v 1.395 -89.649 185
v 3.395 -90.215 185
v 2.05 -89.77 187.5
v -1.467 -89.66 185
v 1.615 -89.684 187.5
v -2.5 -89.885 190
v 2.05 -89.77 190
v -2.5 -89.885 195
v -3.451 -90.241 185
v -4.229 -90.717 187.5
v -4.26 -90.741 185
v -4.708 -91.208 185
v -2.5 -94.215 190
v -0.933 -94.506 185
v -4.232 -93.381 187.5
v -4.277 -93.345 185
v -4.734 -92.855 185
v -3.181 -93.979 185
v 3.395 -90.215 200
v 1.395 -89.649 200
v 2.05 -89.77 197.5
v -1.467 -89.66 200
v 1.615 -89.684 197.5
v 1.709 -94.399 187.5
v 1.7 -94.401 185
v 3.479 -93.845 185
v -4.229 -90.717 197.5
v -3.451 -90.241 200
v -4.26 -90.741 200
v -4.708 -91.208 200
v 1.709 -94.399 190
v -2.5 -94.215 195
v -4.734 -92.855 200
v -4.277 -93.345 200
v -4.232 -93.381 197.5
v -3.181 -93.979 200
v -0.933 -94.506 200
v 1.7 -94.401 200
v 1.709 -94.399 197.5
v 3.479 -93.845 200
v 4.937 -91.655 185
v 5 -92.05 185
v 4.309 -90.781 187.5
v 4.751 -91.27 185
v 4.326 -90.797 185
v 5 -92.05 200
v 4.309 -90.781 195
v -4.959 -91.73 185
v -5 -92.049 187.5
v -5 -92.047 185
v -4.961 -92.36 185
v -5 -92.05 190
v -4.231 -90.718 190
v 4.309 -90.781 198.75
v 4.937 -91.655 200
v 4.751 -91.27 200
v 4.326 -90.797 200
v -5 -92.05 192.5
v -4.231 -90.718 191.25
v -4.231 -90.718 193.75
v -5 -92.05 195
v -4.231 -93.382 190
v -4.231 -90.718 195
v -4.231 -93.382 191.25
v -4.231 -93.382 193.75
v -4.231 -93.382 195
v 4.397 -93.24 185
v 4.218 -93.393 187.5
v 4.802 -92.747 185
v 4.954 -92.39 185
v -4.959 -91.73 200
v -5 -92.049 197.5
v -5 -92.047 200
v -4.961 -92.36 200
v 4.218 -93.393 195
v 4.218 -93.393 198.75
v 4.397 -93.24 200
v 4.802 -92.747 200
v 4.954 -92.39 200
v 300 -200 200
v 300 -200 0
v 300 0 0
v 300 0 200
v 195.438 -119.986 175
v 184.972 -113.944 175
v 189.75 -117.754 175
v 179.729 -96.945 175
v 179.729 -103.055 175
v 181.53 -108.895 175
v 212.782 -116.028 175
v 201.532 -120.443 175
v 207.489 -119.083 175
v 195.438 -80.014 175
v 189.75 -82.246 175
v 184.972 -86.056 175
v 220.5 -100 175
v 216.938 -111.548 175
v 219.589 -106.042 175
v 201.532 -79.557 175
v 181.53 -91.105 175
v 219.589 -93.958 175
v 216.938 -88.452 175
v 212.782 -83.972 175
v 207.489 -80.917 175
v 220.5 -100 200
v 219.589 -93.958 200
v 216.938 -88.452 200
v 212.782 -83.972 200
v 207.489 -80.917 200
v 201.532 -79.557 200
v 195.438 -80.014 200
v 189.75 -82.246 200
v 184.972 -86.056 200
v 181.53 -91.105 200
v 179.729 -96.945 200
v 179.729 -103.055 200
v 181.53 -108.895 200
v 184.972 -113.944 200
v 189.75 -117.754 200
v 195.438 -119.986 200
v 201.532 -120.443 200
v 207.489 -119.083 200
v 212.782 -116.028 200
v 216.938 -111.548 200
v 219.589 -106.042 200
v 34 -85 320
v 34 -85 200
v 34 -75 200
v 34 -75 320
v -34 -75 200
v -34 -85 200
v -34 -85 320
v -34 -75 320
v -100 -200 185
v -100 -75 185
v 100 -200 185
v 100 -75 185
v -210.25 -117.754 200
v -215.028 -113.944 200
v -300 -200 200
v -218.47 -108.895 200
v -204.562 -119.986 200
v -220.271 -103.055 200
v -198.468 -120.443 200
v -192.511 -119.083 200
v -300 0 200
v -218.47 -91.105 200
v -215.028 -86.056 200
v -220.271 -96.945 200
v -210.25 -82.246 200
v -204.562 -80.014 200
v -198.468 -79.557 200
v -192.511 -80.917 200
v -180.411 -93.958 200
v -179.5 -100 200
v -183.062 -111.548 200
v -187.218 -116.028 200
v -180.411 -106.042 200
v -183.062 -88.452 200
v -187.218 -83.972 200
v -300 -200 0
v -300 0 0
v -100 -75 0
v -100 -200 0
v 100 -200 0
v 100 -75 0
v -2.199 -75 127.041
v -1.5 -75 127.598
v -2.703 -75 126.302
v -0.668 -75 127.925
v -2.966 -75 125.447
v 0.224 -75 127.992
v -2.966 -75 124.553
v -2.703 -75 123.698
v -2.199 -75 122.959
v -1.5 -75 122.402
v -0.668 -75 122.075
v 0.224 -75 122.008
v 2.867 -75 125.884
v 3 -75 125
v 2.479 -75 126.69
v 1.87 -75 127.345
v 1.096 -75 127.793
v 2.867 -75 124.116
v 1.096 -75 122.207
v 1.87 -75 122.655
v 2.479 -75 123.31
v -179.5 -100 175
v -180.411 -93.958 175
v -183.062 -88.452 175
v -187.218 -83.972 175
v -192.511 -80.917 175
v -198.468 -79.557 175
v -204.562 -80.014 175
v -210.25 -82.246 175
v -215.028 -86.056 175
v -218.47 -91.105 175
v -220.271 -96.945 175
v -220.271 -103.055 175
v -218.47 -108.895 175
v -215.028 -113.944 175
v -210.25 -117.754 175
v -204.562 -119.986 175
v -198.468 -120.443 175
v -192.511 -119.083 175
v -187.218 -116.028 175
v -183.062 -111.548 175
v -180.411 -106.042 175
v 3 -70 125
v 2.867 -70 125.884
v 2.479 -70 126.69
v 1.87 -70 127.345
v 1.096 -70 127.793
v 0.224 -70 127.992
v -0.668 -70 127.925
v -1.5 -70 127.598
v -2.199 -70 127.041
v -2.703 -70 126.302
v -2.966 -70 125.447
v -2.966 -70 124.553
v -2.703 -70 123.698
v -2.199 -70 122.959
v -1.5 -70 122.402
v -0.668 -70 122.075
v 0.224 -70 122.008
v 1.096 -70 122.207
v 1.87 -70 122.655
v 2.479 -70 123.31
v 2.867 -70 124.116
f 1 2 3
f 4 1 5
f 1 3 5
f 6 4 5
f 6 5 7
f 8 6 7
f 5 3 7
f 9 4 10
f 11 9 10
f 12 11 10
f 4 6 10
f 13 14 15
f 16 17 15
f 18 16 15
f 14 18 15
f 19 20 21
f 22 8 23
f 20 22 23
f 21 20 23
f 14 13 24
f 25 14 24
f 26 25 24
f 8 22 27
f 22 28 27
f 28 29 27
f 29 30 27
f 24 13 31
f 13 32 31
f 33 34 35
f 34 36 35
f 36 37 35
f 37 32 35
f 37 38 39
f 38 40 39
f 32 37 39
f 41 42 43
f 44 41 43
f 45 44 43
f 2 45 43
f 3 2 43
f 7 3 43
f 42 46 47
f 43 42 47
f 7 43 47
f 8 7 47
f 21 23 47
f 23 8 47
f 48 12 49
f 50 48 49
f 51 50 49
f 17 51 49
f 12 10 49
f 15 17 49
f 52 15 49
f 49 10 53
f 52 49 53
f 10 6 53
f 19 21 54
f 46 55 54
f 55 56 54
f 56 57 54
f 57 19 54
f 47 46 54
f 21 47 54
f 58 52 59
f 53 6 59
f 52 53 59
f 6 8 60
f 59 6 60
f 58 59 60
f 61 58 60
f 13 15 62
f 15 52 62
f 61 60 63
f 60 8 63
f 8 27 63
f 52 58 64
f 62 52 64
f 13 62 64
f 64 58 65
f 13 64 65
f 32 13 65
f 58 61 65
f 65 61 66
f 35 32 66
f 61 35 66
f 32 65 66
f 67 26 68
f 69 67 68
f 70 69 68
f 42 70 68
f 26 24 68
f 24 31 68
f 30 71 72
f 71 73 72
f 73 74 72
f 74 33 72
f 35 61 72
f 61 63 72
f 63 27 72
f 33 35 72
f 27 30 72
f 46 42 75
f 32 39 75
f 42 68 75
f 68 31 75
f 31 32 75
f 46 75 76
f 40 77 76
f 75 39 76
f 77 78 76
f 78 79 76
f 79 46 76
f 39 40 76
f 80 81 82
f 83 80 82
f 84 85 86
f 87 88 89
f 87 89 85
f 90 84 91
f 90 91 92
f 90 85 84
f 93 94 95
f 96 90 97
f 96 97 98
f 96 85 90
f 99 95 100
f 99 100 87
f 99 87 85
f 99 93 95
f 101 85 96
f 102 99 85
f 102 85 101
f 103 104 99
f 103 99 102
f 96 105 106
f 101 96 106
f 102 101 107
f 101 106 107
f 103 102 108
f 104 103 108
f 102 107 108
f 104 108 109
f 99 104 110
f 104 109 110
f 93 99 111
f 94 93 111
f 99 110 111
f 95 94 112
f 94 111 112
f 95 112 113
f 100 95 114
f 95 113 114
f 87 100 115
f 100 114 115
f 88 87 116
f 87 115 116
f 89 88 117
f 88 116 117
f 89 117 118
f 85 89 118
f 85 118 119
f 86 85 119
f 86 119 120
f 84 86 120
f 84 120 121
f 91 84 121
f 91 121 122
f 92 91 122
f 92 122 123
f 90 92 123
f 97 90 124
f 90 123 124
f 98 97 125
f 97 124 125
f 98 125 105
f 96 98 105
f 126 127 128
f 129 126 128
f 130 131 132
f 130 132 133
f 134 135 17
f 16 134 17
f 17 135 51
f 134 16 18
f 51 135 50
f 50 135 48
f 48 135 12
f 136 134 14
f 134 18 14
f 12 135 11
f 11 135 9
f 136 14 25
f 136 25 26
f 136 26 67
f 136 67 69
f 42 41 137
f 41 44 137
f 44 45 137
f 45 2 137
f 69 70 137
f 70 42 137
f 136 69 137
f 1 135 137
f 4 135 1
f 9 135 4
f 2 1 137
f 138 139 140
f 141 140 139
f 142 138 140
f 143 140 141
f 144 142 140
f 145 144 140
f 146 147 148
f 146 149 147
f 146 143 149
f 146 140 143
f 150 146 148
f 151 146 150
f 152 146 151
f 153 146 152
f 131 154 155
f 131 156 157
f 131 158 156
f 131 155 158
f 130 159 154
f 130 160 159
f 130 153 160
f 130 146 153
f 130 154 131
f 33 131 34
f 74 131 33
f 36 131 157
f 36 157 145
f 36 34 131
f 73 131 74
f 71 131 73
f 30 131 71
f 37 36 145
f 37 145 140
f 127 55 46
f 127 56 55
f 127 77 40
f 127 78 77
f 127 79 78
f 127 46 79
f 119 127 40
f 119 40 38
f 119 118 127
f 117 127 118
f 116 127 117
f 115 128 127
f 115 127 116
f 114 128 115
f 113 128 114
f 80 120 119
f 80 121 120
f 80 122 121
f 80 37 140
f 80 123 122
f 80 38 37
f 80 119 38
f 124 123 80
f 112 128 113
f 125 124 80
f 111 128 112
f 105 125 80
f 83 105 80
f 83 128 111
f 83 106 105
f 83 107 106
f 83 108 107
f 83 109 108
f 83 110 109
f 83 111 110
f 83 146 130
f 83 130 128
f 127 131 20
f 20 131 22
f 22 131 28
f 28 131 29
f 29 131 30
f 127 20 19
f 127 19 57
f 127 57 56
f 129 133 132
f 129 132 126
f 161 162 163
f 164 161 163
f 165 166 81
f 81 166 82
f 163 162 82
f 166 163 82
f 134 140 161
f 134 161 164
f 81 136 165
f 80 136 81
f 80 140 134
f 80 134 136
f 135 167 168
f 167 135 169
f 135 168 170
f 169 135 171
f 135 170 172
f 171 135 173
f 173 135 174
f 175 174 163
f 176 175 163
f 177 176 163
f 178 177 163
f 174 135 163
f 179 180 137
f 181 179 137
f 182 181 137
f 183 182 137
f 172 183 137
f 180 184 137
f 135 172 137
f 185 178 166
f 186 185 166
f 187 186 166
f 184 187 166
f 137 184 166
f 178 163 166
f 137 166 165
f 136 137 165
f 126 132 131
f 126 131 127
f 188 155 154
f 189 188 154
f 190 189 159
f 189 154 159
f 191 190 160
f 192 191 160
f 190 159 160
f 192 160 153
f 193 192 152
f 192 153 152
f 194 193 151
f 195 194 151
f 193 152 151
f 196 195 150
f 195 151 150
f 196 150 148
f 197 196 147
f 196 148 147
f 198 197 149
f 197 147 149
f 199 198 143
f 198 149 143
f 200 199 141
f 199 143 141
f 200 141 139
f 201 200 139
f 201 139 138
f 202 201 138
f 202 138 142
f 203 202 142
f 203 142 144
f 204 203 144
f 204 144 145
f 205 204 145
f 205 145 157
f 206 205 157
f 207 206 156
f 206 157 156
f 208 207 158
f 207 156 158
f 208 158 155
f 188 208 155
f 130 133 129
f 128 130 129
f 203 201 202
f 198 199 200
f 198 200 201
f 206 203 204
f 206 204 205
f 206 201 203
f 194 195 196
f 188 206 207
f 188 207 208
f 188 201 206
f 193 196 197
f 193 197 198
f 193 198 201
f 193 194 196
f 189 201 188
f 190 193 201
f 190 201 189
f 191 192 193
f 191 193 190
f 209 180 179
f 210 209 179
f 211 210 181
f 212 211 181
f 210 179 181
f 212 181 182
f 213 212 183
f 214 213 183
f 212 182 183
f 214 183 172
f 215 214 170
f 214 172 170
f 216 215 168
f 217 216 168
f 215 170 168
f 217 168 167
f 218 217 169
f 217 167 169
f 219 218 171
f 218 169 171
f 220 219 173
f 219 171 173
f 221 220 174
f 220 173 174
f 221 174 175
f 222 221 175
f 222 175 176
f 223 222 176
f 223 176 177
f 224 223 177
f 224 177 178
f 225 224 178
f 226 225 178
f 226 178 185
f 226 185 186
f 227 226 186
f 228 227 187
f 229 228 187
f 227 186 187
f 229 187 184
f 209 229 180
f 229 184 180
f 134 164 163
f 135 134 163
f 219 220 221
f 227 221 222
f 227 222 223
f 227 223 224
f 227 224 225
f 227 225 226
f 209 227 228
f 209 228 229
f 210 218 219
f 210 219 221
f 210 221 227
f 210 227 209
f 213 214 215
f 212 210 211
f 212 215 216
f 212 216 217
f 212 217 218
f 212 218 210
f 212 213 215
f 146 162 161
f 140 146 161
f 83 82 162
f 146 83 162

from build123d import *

# Parameters (mm, degrees)
F0_W      = 200
F0_H      = 75
F1_DEPTH  = 200
F2_W      = 200
F2_H      = 15
F3_DEPTH  = 125
F4_W      = 68
F4_H      = 10
F5_DEPTH  = 120
F7_DEPTH  = 15
F8_R      = 3
F9_DEPTH  = 5
F10_R     = 20.5
F11_DEPTH = 25


with BuildPart() as f1:
    # F0 (on Top) → F1 (new body)
    with BuildSketch(Plane.XY):
        Polygon((-100, -75), (-100, 0), (-300, 0), (-300, -200), (-100, -200), align=None)
        Polygon((300, 0), (100, 0), (100, -75), (100, -200), (300, -200), align=None)
        with Locations((0, -37.5)):
            Rectangle(F0_W, F0_H)
    extrude(amount=F1_DEPTH)

    # F2 (on face) → F3 (join)
    with BuildSketch(Plane.XZ.offset(75)):
        with Locations((0, 192.5)):
            Rectangle(F2_W, F2_H)
    extrude(amount=F3_DEPTH)

    # F4 (on face) → F5 (join)
    with BuildSketch(Plane.XY.offset(200)):
        with Locations((0, -80)):
            Rectangle(F4_W, F4_H)
    extrude(amount=F5_DEPTH)

    # F6 (on face) → F7 (cut, through all)
    with BuildSketch(Plane.XY.offset(200)):
        with BuildLine():
            add(Edge.make_bspline(
                [(5, -92.05), (5, -87.719873), (-2.5, -89.884936), (-10, -92.05), (-2.5, -94.215064), (5, -96.380127), (5, -92.05)],
                knots=[0, 0, 0, 2.094395, 2.094395, 4.18879, 4.18879, 6.283185, 6.283185, 6.283185], degree=2, weights=[1, 0.5, 1, 0.5, 1, 0.5, 1]))
        make_face()
    extrude(amount=-F7_DEPTH, mode=Mode.SUBTRACT)

    # F8 (on face) → F9 (cut)
    with BuildSketch(Plane.XZ.offset(75)):
        with Locations((0, 125)):
            Circle(F8_R)
    extrude(amount=-F9_DEPTH, mode=Mode.SUBTRACT)

    # F10 (on face) → F11 (cut)
    with BuildSketch(Plane.XY.offset(200)):
        with Locations((-200, -100)):
            Circle(F10_R)
        with Locations((200, -100)):
            Circle(F10_R)
    extrude(amount=-F11_DEPTH, mode=Mode.SUBTRACT)


solid = f1.part
